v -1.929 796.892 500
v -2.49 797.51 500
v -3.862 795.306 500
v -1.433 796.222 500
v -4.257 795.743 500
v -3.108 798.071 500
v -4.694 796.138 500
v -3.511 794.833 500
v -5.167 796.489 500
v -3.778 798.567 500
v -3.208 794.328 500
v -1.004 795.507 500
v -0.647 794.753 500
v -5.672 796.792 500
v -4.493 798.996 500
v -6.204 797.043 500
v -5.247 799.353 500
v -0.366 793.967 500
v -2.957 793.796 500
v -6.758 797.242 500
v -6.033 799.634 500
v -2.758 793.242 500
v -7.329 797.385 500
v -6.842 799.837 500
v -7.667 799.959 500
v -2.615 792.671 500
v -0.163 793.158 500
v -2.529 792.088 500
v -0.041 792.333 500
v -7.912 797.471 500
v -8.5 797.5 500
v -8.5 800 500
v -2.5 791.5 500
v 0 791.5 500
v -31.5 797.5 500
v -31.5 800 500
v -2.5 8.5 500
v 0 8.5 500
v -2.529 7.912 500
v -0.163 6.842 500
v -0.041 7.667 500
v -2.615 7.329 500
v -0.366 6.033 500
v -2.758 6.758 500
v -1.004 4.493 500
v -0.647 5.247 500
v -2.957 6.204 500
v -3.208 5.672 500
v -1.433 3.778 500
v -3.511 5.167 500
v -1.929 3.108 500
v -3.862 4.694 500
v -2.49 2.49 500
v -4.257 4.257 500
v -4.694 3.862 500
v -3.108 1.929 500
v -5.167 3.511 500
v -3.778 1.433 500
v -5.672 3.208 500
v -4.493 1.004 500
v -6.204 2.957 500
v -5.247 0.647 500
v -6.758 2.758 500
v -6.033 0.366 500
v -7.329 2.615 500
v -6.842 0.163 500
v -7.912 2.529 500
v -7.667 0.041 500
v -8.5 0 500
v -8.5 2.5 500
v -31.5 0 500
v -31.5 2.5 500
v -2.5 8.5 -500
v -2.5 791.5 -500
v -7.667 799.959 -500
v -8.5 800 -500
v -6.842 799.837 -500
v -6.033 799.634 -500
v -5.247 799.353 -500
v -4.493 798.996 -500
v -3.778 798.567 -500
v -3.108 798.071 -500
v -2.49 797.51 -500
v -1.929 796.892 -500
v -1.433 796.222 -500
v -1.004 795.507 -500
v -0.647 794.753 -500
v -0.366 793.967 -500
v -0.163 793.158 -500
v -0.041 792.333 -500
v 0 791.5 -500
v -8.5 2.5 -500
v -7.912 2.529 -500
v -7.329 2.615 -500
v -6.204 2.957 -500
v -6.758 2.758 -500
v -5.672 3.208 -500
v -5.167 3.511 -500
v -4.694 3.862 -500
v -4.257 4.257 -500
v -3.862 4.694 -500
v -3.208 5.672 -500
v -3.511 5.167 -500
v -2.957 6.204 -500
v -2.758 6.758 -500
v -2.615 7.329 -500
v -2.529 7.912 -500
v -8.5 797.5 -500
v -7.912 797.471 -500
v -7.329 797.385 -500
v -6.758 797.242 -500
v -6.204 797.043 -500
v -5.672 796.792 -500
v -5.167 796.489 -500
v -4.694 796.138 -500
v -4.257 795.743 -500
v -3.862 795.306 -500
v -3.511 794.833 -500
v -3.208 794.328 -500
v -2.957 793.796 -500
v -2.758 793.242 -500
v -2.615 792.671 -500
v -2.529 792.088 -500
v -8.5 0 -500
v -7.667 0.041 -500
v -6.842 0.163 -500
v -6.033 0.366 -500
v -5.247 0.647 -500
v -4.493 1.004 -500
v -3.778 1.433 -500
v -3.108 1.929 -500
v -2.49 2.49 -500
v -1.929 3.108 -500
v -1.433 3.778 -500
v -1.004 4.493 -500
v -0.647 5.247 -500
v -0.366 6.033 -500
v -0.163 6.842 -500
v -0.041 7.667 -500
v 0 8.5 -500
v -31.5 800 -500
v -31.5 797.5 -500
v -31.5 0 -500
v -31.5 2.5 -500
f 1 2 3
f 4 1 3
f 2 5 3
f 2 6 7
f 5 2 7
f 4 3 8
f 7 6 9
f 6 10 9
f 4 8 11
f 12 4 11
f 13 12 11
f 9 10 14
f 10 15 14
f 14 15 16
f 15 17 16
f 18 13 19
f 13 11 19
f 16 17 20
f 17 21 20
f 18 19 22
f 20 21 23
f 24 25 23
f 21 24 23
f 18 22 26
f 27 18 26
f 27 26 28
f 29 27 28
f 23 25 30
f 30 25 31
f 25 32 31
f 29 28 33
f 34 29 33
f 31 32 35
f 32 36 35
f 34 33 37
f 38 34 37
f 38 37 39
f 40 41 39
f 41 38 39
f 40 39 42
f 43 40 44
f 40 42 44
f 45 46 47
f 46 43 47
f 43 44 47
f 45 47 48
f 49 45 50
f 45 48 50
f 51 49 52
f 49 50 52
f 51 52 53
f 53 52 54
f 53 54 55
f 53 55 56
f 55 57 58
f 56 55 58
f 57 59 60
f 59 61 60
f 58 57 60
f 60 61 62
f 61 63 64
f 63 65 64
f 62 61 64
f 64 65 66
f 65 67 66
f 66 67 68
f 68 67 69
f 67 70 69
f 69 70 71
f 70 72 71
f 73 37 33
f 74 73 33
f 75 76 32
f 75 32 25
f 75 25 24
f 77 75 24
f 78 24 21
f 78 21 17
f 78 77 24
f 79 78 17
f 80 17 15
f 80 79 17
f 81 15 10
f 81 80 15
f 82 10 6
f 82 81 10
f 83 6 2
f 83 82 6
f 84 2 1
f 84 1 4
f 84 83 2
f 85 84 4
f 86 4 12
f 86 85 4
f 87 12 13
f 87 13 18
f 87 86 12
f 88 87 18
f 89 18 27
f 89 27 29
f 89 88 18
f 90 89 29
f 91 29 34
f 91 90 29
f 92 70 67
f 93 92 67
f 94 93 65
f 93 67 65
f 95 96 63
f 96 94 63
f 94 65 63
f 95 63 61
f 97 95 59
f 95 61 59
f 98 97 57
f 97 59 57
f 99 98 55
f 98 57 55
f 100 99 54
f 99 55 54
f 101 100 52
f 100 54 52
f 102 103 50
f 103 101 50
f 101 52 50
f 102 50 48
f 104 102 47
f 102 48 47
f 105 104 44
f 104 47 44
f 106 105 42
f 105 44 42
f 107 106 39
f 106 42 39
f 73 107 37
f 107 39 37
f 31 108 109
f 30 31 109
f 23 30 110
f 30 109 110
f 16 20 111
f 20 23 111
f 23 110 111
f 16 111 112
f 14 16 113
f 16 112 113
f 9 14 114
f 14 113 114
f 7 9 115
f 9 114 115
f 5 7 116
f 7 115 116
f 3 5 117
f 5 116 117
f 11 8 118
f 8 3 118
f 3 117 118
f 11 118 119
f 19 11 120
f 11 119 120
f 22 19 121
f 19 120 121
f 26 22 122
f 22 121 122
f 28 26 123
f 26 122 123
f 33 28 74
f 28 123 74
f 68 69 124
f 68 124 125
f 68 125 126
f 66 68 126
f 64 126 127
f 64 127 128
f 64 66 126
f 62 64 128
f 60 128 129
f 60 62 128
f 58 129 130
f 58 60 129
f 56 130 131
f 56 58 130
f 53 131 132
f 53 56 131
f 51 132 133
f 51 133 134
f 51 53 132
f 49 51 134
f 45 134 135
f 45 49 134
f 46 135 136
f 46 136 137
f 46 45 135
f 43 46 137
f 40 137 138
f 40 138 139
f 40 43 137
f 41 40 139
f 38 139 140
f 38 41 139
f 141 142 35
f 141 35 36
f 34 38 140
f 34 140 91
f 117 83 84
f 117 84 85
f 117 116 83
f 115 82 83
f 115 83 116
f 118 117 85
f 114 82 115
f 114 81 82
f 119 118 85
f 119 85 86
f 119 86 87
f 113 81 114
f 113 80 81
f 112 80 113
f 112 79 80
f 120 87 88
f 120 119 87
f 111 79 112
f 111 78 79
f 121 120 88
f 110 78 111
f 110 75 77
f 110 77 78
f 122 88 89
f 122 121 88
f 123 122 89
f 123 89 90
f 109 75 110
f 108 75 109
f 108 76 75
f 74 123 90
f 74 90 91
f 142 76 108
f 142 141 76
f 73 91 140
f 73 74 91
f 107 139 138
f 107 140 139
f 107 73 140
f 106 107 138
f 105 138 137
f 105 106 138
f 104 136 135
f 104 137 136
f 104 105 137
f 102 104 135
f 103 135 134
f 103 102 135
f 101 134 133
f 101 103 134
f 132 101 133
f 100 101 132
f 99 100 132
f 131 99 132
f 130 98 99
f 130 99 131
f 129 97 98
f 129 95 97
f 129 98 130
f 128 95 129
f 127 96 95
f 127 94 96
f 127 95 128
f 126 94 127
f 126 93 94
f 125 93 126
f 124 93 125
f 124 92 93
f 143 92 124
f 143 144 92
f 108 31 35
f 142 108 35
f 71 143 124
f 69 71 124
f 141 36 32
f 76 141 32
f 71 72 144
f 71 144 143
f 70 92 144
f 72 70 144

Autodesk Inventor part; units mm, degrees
ref_plane "YZ Plane" through (0, 0, 0) normal (1, 0, 0) x (0, 1, 0)
ref_plane "XZ Plane" through (0, 0, 0) normal (0, 1, 0) x (-1, 0, 0)
ref_plane "XY Plane" through (0, 0, 0) normal (0, 0, 1) x (1, 0, 0)
sketch "Náčrt2" plane through (0, 0, 0) normal (1, 0, 0) x (0, 1, 0)
  line L0 (800, 500) -> (0, 500)
  line L1 (0, 500) -> (0, -500)
  line L2 (0, -500) -> (800, -500)
  line L3 (800, -500) -> (800, 500)
  point P0 (0, 0)
  point P1 (0, 0)
  dimension "d0" = 1000
  dimension "d1" = 800
extrude "Vysunutí1" add sketch "Náčrt2" against normal blind 2.5
sketch "Náčrt3" plane through (0, 797.5, -500) normal (0, 1, 0) x (-1, 0, 0)
  line L0 (0, 1000) -> (0, 0)
  line L1 (0, 0) -> (31.5, 0)
  line L2 (31.5, 0) -> (31.5, 1000)
  line L3 (31.5, 1000) -> (0, 1000)
edge flange "Obruba1" height 31.5 angle 90 thickness 2.5 bend radius 6 thickness toward (0, 1, 0) relief tear relief width 2.5 relief depth 1.25 corner gap 2.5 corner form 0 edges at (-2.5, 800, 0) (-2.5, 0, 0) wall of the first edge with corners at (0, 797.5, 500) (0, 797.5, -500) (-31.5, 797.5, -500) (-31.5, 797.5, 500)
bend "Ohyb1"
corner "Roh1"
equation "\"d4\" = ŠířkaVýštipu"
equation "\"d5\" = HloubkaVýštipu"
equation "\"d6\" = MinimálníZbytek"
equation "\"d7\" = PoloměrOhybu"
equation "\"d11\" = VelikostRohovéhoVýštipu"
equation "\"d12\" = VelikostMezery"
equation "\"d13\" = VelikostJacobihoPoloměru"
equation "\"PoloměrOhybu\" = Tloušťka"
equation "\"ŠířkaVýštipu\" = Tloušťka"
equation "\"HloubkaVýštipu\" = 0.5 * Tloušťka"
equation "\"MinimálníZbytek\" = 2 * Tloušťka"
equation "\"PřechodovýPoloměr\" = PoloměrOhybu"
equation "\"VelikostJacobihoPoloměru\" = PoloměrOhybu"
equation "\"VelikostMezery\" = Tloušťka"
equation "\"VelikostRohovéhoVýštipu\" = 10"
equation "\"Tloušťka\" = 2.5"
properties part number "DD_KVD_002_01" material "Nerezová ocel"
